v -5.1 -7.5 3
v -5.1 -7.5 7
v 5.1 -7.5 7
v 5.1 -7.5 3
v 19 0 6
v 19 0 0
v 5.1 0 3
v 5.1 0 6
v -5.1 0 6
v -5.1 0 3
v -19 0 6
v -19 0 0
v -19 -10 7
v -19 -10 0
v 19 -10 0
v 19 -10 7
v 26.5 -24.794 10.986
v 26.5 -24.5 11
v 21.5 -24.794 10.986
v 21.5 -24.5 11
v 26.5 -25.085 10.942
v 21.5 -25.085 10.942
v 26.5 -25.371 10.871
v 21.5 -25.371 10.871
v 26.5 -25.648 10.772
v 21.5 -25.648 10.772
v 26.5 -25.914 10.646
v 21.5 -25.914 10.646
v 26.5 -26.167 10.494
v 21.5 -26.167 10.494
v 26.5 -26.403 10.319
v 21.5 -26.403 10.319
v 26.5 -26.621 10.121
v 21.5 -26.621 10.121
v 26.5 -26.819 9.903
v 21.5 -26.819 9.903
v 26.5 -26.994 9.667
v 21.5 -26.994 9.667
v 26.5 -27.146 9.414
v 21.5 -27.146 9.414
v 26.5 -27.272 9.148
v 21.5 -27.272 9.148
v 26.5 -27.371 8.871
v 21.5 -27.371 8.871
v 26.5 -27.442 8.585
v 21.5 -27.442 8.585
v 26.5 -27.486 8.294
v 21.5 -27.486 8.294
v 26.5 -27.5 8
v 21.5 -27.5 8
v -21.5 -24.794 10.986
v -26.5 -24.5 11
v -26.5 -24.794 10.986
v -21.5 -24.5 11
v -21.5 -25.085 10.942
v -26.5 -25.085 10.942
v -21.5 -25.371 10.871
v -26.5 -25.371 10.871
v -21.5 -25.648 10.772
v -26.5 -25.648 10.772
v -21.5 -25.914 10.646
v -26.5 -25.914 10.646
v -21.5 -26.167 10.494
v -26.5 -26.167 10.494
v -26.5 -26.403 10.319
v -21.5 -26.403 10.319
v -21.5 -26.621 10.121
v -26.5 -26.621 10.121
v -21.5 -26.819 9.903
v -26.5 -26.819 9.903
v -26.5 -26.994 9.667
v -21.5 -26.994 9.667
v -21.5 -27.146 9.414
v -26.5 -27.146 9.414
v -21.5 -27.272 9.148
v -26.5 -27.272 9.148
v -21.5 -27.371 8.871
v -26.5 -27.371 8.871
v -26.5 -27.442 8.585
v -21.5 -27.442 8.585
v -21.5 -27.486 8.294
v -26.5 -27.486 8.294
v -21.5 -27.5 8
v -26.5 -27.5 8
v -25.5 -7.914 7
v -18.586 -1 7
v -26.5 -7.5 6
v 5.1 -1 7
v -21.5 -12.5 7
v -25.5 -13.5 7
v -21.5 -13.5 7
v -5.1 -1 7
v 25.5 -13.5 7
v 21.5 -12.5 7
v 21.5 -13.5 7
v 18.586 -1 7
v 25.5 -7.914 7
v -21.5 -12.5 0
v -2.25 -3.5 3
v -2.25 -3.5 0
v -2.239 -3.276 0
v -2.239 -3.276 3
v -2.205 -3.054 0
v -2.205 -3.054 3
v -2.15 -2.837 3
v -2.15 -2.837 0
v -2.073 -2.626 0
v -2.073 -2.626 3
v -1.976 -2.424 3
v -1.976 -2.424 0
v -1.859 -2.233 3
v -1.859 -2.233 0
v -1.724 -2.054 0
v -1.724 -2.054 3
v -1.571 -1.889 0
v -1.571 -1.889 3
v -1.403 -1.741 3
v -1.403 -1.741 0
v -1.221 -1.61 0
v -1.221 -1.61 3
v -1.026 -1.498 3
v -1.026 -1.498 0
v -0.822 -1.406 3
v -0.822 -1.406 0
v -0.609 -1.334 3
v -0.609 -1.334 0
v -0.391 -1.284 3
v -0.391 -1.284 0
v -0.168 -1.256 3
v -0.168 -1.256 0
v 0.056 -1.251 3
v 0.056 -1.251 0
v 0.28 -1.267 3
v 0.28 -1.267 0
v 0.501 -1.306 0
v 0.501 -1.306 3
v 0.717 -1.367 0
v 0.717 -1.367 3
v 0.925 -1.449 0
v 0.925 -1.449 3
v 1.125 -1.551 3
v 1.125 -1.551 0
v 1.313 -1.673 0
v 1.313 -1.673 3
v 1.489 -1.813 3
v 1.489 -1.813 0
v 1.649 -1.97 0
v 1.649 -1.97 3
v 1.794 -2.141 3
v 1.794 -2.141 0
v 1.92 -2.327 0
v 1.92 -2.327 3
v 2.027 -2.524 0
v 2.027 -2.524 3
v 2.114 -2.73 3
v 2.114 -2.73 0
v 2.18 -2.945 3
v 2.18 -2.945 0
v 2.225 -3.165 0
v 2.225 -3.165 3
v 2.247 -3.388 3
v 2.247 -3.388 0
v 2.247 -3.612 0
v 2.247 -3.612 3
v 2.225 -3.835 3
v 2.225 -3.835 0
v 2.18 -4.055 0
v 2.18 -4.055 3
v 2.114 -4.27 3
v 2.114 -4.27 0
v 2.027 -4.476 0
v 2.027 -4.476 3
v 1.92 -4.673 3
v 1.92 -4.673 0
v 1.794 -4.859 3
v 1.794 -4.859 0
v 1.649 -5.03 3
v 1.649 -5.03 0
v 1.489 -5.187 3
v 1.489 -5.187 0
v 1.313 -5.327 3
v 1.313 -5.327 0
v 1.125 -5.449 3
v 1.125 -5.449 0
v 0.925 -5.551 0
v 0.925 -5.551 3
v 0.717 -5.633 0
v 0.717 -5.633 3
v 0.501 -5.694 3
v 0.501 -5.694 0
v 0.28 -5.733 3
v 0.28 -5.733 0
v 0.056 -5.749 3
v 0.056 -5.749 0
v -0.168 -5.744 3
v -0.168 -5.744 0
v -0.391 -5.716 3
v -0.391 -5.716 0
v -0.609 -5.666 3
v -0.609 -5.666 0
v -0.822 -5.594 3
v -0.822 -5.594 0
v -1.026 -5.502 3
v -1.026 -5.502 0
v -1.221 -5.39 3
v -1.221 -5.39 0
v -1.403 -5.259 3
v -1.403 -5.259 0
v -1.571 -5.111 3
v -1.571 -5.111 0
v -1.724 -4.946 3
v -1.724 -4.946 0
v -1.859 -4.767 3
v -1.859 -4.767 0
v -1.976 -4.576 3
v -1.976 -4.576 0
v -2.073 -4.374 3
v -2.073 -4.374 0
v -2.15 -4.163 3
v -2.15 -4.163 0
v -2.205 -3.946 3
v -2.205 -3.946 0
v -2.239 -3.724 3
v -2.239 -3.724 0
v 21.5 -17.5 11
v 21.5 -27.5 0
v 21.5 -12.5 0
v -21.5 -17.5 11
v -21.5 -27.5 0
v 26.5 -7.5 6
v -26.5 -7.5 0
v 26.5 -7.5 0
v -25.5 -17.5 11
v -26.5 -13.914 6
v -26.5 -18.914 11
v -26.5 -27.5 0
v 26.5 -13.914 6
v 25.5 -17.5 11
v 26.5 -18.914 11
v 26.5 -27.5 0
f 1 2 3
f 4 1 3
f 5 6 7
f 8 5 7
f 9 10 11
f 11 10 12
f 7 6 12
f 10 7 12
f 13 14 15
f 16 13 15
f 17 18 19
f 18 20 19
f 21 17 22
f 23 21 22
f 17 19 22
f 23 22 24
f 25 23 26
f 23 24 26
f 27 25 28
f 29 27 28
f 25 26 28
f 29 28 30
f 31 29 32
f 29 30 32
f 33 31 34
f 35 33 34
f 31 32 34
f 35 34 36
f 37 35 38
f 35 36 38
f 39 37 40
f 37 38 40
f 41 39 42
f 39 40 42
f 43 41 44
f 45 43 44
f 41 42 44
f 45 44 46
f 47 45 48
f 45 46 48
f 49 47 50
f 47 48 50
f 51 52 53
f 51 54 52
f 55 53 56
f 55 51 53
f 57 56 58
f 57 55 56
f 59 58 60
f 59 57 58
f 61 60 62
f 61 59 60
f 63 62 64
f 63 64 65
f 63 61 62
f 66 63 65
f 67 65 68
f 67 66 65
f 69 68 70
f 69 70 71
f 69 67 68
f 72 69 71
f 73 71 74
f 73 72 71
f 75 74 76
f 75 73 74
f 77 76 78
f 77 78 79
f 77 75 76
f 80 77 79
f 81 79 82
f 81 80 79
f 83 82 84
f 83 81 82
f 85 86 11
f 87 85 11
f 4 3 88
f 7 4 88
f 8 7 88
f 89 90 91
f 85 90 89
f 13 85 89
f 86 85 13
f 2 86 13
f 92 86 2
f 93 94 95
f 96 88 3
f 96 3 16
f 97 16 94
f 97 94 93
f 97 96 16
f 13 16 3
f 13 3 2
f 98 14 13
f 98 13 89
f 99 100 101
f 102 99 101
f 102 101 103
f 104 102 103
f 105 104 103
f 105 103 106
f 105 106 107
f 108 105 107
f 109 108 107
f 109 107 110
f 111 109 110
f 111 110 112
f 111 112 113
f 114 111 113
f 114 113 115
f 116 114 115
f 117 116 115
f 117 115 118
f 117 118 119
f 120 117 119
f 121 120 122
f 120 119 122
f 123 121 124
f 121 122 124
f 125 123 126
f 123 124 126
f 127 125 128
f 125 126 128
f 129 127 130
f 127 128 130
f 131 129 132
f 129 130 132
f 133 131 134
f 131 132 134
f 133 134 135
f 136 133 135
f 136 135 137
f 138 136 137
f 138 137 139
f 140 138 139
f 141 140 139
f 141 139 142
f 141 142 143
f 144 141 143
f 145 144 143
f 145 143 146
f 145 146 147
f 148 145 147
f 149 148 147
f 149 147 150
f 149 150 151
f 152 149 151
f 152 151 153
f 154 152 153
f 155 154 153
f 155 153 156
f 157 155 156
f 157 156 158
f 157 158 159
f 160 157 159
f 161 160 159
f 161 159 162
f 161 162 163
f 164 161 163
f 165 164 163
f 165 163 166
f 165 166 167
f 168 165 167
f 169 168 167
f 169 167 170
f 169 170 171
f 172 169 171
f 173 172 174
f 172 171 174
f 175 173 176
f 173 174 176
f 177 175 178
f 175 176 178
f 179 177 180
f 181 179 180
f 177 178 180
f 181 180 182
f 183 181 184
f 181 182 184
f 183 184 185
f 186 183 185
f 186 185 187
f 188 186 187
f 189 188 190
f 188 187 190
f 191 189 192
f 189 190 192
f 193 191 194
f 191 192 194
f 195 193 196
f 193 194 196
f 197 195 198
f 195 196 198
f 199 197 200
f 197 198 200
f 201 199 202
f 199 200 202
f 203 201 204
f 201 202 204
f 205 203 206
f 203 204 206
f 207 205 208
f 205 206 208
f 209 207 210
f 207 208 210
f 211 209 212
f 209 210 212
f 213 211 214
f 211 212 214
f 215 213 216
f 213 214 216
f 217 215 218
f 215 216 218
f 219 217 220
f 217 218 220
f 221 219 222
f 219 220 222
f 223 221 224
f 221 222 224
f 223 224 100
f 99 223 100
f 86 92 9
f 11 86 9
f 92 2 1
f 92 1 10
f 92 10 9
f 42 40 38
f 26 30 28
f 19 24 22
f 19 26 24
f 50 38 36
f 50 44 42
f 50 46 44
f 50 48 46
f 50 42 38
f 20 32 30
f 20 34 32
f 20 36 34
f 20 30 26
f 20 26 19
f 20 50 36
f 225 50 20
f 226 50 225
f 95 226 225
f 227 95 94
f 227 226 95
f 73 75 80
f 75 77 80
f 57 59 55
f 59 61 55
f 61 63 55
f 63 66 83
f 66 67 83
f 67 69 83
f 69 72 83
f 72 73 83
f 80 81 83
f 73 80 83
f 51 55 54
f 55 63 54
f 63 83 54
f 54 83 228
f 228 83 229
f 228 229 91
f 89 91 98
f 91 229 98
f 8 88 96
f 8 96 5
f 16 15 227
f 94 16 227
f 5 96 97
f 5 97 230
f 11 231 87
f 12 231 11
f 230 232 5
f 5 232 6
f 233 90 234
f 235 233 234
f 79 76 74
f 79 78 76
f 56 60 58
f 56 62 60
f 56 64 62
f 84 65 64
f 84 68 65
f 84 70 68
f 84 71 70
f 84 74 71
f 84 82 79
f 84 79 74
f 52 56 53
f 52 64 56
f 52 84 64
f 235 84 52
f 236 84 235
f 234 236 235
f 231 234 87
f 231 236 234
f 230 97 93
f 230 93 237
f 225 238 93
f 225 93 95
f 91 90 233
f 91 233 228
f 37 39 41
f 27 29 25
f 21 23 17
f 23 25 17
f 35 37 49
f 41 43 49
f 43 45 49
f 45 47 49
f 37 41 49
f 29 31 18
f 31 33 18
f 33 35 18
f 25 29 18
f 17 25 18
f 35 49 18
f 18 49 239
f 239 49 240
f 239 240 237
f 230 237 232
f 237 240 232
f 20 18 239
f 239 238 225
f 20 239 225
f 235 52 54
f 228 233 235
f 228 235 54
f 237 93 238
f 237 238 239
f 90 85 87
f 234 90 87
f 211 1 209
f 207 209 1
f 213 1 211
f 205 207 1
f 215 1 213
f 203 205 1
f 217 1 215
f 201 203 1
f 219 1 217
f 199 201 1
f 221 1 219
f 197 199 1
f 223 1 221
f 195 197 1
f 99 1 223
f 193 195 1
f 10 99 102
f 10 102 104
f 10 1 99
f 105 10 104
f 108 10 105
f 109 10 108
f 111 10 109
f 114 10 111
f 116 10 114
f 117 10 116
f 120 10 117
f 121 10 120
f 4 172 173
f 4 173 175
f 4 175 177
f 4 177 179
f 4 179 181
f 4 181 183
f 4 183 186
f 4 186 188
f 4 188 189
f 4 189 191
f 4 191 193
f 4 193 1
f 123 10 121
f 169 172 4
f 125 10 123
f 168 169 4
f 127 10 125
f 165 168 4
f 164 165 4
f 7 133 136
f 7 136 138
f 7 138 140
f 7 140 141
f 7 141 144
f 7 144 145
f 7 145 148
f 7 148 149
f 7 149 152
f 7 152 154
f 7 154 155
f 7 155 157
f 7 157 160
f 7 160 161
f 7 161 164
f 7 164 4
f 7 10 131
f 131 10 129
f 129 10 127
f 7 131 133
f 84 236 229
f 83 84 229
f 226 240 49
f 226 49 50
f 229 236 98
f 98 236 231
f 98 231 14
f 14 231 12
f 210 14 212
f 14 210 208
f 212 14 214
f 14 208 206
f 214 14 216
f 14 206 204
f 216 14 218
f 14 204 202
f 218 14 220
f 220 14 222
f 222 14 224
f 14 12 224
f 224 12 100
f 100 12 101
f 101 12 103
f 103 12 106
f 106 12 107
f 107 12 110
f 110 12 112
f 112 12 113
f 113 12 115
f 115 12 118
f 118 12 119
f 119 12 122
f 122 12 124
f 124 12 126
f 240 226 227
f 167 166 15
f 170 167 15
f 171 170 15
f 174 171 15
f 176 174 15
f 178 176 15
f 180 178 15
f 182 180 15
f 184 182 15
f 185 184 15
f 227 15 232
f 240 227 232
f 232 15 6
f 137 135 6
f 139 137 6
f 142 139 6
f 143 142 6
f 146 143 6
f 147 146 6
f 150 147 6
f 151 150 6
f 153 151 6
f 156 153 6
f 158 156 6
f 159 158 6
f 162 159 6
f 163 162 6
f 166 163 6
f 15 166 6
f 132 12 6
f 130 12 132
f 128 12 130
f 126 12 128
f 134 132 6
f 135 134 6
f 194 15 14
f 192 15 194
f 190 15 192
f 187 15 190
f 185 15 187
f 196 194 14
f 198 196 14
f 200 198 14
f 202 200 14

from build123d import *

# Parameters (mm, degrees)
BOSS_EXTRUDE1_DEPTH  = 7
SKETCH6_W            = 5
SKETCH6_H            = 10
BOSS_EXTRUDE2_DEPTH  = 4
SKETCH3_W            = 5.1
SKETCH3_H            = 7.5
CUT_EXTRUDE1_DEPTH   = 4
M4_CLEARANCE_HOLE1_D = 4.5
CHAMFER2_SIZE        = 4
FILLET2_R            = 3


# Some blends are built 0.0001 mm under size
with BuildPart() as part:
    # Sketch1 → Boss-Extrude1 (new body)
    with BuildSketch(Plane.XY):
        Polygon((0, 0), (0, -10), (-19, -10), (-21.5, -12.5), (-21.5, -27.5), (-26.5, -27.5), (-26.5, -7.5), (-19, 0), align=None)
    boss_extrude1 = extrude(amount=BOSS_EXTRUDE1_DEPTH)

    # Sketch6 → Boss-Extrude2 (add)
    with BuildSketch(Plane.XY.offset(7)):
        with Locations((-24, -22.5)):
            Rectangle(SKETCH6_W, SKETCH6_H)
    boss_extrude2 = extrude(amount=BOSS_EXTRUDE2_DEPTH)

    # Sketch3 → Cut-Extrude1 (cut)
    with BuildSketch(Plane.XY.offset(7)):
        with Locations((-2.55, -3.75)):
            Rectangle(SKETCH3_W, SKETCH3_H)
    cut_extrude1 = extrude(amount=-CUT_EXTRUDE1_DEPTH, mode=Mode.SUBTRACT)

    # Mirror1: Boss-Extrude1, Boss-Extrude2, Cut-Extrude1 across plane
    add(boss_extrude1.mirror(Plane(origin=(0, 0, 7), x_dir=(0, 0, 1), z_dir=(-1, 0, 0))))
    add(boss_extrude2.mirror(Plane(origin=(0, 0, 7), x_dir=(0, 0, 1), z_dir=(-1, 0, 0))))
    add(cut_extrude1.mirror(Plane(origin=(0, 0, 7), x_dir=(0, 0, 1), z_dir=(-1, 0, 0))), mode=Mode.SUBTRACT)

    # M4 Clearance Hole1 (through all)
    with Locations(Plane.XY.offset(3)):
        with Locations((0, -3.5)):
            Hole(M4_CLEARANCE_HOLE1_D / 2)

    # Chamfer2
    chamfer2_edges = [part.edges().sort_by_distance(p)[0] for p in [
        (-24, -17.5, 7),
        (24, -17.5, 7),
    ]]
    chamfer(chamfer2_edges, length=CHAMFER2_SIZE - 0.0001)  # a hair under: the kernel refuses the full size

    # Chamfer4
    # the kernel refuses this chamfer: 1 mm, written as the material it takes off along each edge
    with BuildSketch(Plane(origin=(26.5, -11.68164552, 5.18154552), x_dir=(-0.9996219169112968, 0.019442520806014118, 0.01944252080601436), z_dir=(0, -0.7071067811865476, 0.7071067811865476))) as chamfer4_piece_1_section:
        with BuildLine():
            Line((1.028673195, 0), (-0.056547155, 1.027117794))
            Line((-0.056547155, 1.027117794), (-0.076539593, 1.026567876))
            ThreePointArc((-0.076539593, 1.026567876), (-0.034129227, 0.51339783), (-0.019992438, -0.000549918))
            Line((-0.019992438, -0.000549918), (0.000549918, -0.019992438))
            ThreePointArc((0.000549918, -0.019992438), (0.514497665, -0.00585565), (1.029223113, -0.019992438))
            Line((1.029223113, -0.019992438), (1.028673195, 0))
        make_face()
    chamfer4_piece_1 = extrude(amount=10.800078804, mode=Mode.PRIVATE)
    chamfer4_piece_1 = split(chamfer4_piece_1, bisect_by=Plane(origin=(26.156619069, -15.715277747, 7), z_dir=(0, 0, 1)), keep=Keep.TOP, mode=Mode.PRIVATE)
    add(chamfer4_piece_1, mode=Mode.SUBTRACT)
    with BuildSketch(Plane(origin=(-26.5, -11.68164552, 5.18154552), x_dir=(0.9996219169112968, 0.019442520806013806, 0.019442520806013806), z_dir=(0, -0.7071067811865476, 0.7071067811865476))) as chamfer4_piece_2_section:
        with BuildLine():
            Line((1.028673195, 0), (-0.056547155, -1.027117794))
            Line((-0.056547155, -1.027117794), (-0.076539593, -1.026567876))
            ThreePointArc((-0.076539593, -1.026567876), (-0.034129227, -0.51339783), (-0.019992438, 0.000549918))
            Line((-0.019992438, 0.000549918), (0.000549918, 0.019992438))
            ThreePointArc((0.000549918, 0.019992438), (0.514497665, 0.00585565), (1.029223113, 0.019992438))
            Line((1.029223113, 0.019992438), (1.028673195, 0))
        make_face()
    chamfer4_piece_2 = extrude(amount=10.800078804, mode=Mode.PRIVATE)
    chamfer4_piece_2 = split(chamfer4_piece_2, bisect_by=Plane(origin=(-26.156619069, -15.715277747, 7), z_dir=(0, 0, 1)), keep=Keep.TOP, mode=Mode.PRIVATE)
    add(chamfer4_piece_2, mode=Mode.SUBTRACT)
    with BuildSketch(Plane(origin=(-28.31845448, -9.31845448, 7), x_dir=(0.7068394360706726, -0.7068394360706746, 0.027495876610586528), z_dir=(0.7071067811865485, 0.7071067811865466, 0))) as chamfer4_piece_3:
        with BuildLine():
            Line((1.028673195, 0), (-0.056547155, 1.027117794))
            Line((-0.056547155, 1.027117794), (-0.076539593, 1.026567876))
            ThreePointArc((-0.076539593, 1.026567876), (-0.034129227, 0.51339783), (-0.019992438, -0.000549918))
            Line((-0.019992438, -0.000549918), (0.000549918, -0.019992438))
            ThreePointArc((0.000549918, -0.019992438), (0.514497665, -0.00585565), (1.029223113, -0.019992438))
            Line((1.029223113, -0.019992438), (1.028673195, 0))
        make_face()
    extrude(amount=15.749967694, mode=Mode.SUBTRACT)
    with BuildSketch(Plane(origin=(-26.5, -16.071782988, 7), x_dir=(0.9996219169112968, 0, 0.02749587661058651), z_dir=(0, 1, 0))) as chamfer4_piece_4_section:
        with BuildLine():
            Line((1.028673195, 0), (-0.056547155, 1.027117794))
            Line((-0.056547155, 1.027117794), (-0.076539593, 1.026567876))
            ThreePointArc((-0.076539593, 1.026567876), (-0.034129227, 0.51339783), (-0.019992438, -0.000549918))
            Line((-0.019992438, -0.000549918), (0.000549918, -0.019992438))
            ThreePointArc((0.000549918, -0.019992438), (0.514497665, -0.00585565), (1.029223113, -0.019992438))
            Line((1.029223113, -0.019992438), (1.028673195, 0))
        make_face()
    chamfer4_piece_4 = extrude(amount=11.143465976, mode=Mode.PRIVATE)
    chamfer4_piece_4 = split(chamfer4_piece_4, bisect_by=Plane(origin=(-26.166087376, -11.115587602, 4.615487602), z_dir=(0, 0.7071067811865476, 0.7071067811865476)), keep=Keep.TOP, mode=Mode.PRIVATE)
    add(chamfer4_piece_4, mode=Mode.SUBTRACT)
    with BuildSketch(Plane(origin=(-21.571682988, 0, 7), x_dir=(0, -0.9996219169112968, 0.027495876610586494), z_dir=(1, 0, 0))) as chamfer4_piece_5:
        with BuildLine():
            Line((1.028673195, 0), (-0.056547155, 1.027117794))
            Line((-0.056547155, 1.027117794), (-0.076539593, 1.026567876))
            ThreePointArc((-0.076539593, 1.026567876), (-0.034129227, 0.51339783), (-0.019992438, -0.000549918))
            Line((-0.019992438, -0.000549918), (0.000549918, -0.019992438))
            ThreePointArc((0.000549918, -0.019992438), (0.514497665, -0.00585565), (1.029223113, -0.019992438))
            Line((1.029223113, -0.019992438), (1.028673195, 0))
        make_face()
    extrude(amount=19.043365976, mode=Mode.SUBTRACT)
    with BuildSketch(Plane(origin=(26.5, -16.071782988, 7), x_dir=(-0.9996219169112968, 0, 0.02749587661058651), z_dir=(0, 1, 0))) as chamfer4_piece_6_section:
        with BuildLine():
            Line((1.028673195, 0), (-0.056547155, -1.027117794))
            Line((-0.056547155, -1.027117794), (-0.076539593, -1.026567876))
            ThreePointArc((-0.076539593, -1.026567876), (-0.034129227, -0.51339783), (-0.019992438, 0.000549918))
            Line((-0.019992438, 0.000549918), (0.000549918, 0.019992438))
            ThreePointArc((0.000549918, 0.019992438), (0.514497665, 0.00585565), (1.029223113, 0.019992438))
            Line((1.029223113, 0.019992438), (1.028673195, 0))
        make_face()
    chamfer4_piece_6 = extrude(amount=11.143465976, mode=Mode.PRIVATE)
    chamfer4_piece_6 = split(chamfer4_piece_6, bisect_by=Plane(origin=(26.166087376, -11.115587602, 4.615487602), z_dir=(0, 0.7071067811865476, 0.7071067811865476)), keep=Keep.TOP, mode=Mode.PRIVATE)
    add(chamfer4_piece_6, mode=Mode.SUBTRACT)
    with BuildSketch(Plane(origin=(28.31845448, -9.31845448, 7), x_dir=(-0.7068394360706725, -0.7068394360706747, 0.027495876610586528), z_dir=(-0.7071067811865487, 0.7071067811865464, 0))) as chamfer4_piece_7:
        with BuildLine():
            Line((1.028673195, 0), (-0.056547155, -1.027117794))
            Line((-0.056547155, -1.027117794), (-0.076539593, -1.026567876))
            ThreePointArc((-0.076539593, -1.026567876), (-0.034129227, -0.51339783), (-0.019992438, 0.000549918))
            Line((-0.019992438, 0.000549918), (0.000549918, 0.019992438))
            ThreePointArc((0.000549918, 0.019992438), (0.514497665, 0.00585565), (1.029223113, 0.019992438))
            Line((1.029223113, 0.019992438), (1.028673195, 0))
        make_face()
    extrude(amount=15.749967694, mode=Mode.SUBTRACT)
    with BuildSketch(Plane(origin=(21.571682988, 0, 7), x_dir=(0, -0.9996219169112968, 0.027495876610586494), z_dir=(-1, 0, 0))) as chamfer4_piece_8:
        with BuildLine():
            Line((1.028673195, 0), (-0.056547155, -1.027117794))
            Line((-0.056547155, -1.027117794), (-0.076539593, -1.026567876))
            ThreePointArc((-0.076539593, -1.026567876), (-0.034129227, -0.51339783), (-0.019992438, 0.000549918))
            Line((-0.019992438, 0.000549918), (0.000549918, 0.019992438))
            ThreePointArc((0.000549918, 0.019992438), (0.514497665, 0.00585565), (1.029223113, 0.019992438))
            Line((1.029223113, 0.019992438), (1.028673195, 0))
        make_face()
    extrude(amount=19.043365976, mode=Mode.SUBTRACT)
    with BuildSketch(Plane(origin=(26.5, -16.071782988, 7), x_dir=(-0.9996219169112968, 0, 0.02749587661058651), z_dir=(0, 1, 0))) as chamfer4_piece_9a_section:
        with BuildLine():
            Line((1.028673195, 0), (-0.056547155, -1.027117794))
            Line((-0.056547155, -1.027117794), (-0.076539593, -1.026567876))
            ThreePointArc((-0.076539593, -1.026567876), (-0.034129227, -0.51339783), (-0.019992438, 0.000549918))
            Line((-0.019992438, 0.000549918), (0.000549918, 0.019992438))
            ThreePointArc((0.000549918, 0.019992438), (0.514497665, 0.00585565), (1.029223113, 0.019992438))
            Line((1.029223113, 0.019992438), (1.028673195, 0))
        make_face()
    chamfer4_piece_9a = extrude(amount=11.143465976, mode=Mode.PRIVATE)
    chamfer4_piece_9a = split(chamfer4_piece_9a, bisect_by=Plane(origin=(26.181906875, -13.879260813, 7.379160813), z_dir=(0, -0.7071067811865476, -0.7071067811865476)), keep=Keep.TOP, mode=Mode.PRIVATE)
    with BuildSketch(Plane(origin=(26.5, -11.68164552, 5.18154552), x_dir=(-0.9996219169112968, 0.019442520806014118, 0.01944252080601436), z_dir=(0, -0.7071067811865476, 0.7071067811865476))) as chamfer4_piece_9b_section:
        with BuildLine():
            Line((1.028673195, 0), (-0.056547155, 1.027117794))
            Line((-0.056547155, 1.027117794), (-0.076539593, 1.026567876))
            ThreePointArc((-0.076539593, 1.026567876), (-0.034129227, 0.51339783), (-0.019992438, -0.000549918))
            Line((-0.019992438, -0.000549918), (0.000549918, -0.019992438))
            ThreePointArc((0.000549918, -0.019992438), (0.514497665, -0.00585565), (1.029223113, -0.019992438))
            Line((1.029223113, -0.019992438), (1.028673195, 0))
        make_face()
    chamfer4_piece_9b = extrude(amount=10.800078804, mode=Mode.PRIVATE)
    chamfer4_piece_9b = split(chamfer4_piece_9b, bisect_by=Plane(origin=(26.181906875, -12.963885635, 7), z_dir=(0, 0, -1)), keep=Keep.TOP, mode=Mode.PRIVATE)
    chamfer4_piece_9 = chamfer4_piece_9a & chamfer4_piece_9b
    add(chamfer4_piece_9, mode=Mode.SUBTRACT)
    with BuildSketch(Plane(origin=(-26.5, -16.071782988, 7), x_dir=(0.9996219169112968, 0, 0.02749587661058651), z_dir=(0, 1, 0))) as chamfer4_piece_10a_section:
        with BuildLine():
            Line((1.028673195, 0), (-0.056547155, 1.027117794))
            Line((-0.056547155, 1.027117794), (-0.076539593, 1.026567876))
            ThreePointArc((-0.076539593, 1.026567876), (-0.034129227, 0.51339783), (-0.019992438, -0.000549918))
            Line((-0.019992438, -0.000549918), (0.000549918, -0.019992438))
            ThreePointArc((0.000549918, -0.019992438), (0.514497665, -0.00585565), (1.029223113, -0.019992438))
            Line((1.029223113, -0.019992438), (1.028673195, 0))
        make_face()
    chamfer4_piece_10a = extrude(amount=11.143465976, mode=Mode.PRIVATE)
    chamfer4_piece_10a = split(chamfer4_piece_10a, bisect_by=Plane(origin=(-26.181906875, -13.879260813, 7.379160813), z_dir=(0, -0.7071067811865476, -0.7071067811865476)), keep=Keep.TOP, mode=Mode.PRIVATE)
    with BuildSketch(Plane(origin=(-26.5, -11.68164552, 5.18154552), x_dir=(0.9996219169112968, 0.019442520806013806, 0.019442520806013806), z_dir=(0, -0.7071067811865476, 0.7071067811865476))) as chamfer4_piece_10b_section:
        with BuildLine():
            Line((1.028673195, 0), (-0.056547155, -1.027117794))
            Line((-0.056547155, -1.027117794), (-0.076539593, -1.026567876))
            ThreePointArc((-0.076539593, -1.026567876), (-0.034129227, -0.51339783), (-0.019992438, 0.000549918))
            Line((-0.019992438, 0.000549918), (0.000549918, 0.019992438))
            ThreePointArc((0.000549918, 0.019992438), (0.514497665, 0.00585565), (1.029223113, 0.019992438))
            Line((1.029223113, 0.019992438), (1.028673195, 0))
        make_face()
    chamfer4_piece_10b = extrude(amount=10.800078804, mode=Mode.PRIVATE)
    chamfer4_piece_10b = split(chamfer4_piece_10b, bisect_by=Plane(origin=(-26.181906875, -12.963885635, 7), z_dir=(0, 0, -1)), keep=Keep.TOP, mode=Mode.PRIVATE)
    chamfer4_piece_10 = chamfer4_piece_10a & chamfer4_piece_10b
    add(chamfer4_piece_10, mode=Mode.SUBTRACT)

    # Fillet2
    fillet2_edges = [part.edges().sort_by_distance(p)[0] for p in [
        (-24, -27.5, 11),
        (24, -27.5, 11),
    ]]
    fillet(fillet2_edges, radius=FILLET2_R)


solid = part.part
